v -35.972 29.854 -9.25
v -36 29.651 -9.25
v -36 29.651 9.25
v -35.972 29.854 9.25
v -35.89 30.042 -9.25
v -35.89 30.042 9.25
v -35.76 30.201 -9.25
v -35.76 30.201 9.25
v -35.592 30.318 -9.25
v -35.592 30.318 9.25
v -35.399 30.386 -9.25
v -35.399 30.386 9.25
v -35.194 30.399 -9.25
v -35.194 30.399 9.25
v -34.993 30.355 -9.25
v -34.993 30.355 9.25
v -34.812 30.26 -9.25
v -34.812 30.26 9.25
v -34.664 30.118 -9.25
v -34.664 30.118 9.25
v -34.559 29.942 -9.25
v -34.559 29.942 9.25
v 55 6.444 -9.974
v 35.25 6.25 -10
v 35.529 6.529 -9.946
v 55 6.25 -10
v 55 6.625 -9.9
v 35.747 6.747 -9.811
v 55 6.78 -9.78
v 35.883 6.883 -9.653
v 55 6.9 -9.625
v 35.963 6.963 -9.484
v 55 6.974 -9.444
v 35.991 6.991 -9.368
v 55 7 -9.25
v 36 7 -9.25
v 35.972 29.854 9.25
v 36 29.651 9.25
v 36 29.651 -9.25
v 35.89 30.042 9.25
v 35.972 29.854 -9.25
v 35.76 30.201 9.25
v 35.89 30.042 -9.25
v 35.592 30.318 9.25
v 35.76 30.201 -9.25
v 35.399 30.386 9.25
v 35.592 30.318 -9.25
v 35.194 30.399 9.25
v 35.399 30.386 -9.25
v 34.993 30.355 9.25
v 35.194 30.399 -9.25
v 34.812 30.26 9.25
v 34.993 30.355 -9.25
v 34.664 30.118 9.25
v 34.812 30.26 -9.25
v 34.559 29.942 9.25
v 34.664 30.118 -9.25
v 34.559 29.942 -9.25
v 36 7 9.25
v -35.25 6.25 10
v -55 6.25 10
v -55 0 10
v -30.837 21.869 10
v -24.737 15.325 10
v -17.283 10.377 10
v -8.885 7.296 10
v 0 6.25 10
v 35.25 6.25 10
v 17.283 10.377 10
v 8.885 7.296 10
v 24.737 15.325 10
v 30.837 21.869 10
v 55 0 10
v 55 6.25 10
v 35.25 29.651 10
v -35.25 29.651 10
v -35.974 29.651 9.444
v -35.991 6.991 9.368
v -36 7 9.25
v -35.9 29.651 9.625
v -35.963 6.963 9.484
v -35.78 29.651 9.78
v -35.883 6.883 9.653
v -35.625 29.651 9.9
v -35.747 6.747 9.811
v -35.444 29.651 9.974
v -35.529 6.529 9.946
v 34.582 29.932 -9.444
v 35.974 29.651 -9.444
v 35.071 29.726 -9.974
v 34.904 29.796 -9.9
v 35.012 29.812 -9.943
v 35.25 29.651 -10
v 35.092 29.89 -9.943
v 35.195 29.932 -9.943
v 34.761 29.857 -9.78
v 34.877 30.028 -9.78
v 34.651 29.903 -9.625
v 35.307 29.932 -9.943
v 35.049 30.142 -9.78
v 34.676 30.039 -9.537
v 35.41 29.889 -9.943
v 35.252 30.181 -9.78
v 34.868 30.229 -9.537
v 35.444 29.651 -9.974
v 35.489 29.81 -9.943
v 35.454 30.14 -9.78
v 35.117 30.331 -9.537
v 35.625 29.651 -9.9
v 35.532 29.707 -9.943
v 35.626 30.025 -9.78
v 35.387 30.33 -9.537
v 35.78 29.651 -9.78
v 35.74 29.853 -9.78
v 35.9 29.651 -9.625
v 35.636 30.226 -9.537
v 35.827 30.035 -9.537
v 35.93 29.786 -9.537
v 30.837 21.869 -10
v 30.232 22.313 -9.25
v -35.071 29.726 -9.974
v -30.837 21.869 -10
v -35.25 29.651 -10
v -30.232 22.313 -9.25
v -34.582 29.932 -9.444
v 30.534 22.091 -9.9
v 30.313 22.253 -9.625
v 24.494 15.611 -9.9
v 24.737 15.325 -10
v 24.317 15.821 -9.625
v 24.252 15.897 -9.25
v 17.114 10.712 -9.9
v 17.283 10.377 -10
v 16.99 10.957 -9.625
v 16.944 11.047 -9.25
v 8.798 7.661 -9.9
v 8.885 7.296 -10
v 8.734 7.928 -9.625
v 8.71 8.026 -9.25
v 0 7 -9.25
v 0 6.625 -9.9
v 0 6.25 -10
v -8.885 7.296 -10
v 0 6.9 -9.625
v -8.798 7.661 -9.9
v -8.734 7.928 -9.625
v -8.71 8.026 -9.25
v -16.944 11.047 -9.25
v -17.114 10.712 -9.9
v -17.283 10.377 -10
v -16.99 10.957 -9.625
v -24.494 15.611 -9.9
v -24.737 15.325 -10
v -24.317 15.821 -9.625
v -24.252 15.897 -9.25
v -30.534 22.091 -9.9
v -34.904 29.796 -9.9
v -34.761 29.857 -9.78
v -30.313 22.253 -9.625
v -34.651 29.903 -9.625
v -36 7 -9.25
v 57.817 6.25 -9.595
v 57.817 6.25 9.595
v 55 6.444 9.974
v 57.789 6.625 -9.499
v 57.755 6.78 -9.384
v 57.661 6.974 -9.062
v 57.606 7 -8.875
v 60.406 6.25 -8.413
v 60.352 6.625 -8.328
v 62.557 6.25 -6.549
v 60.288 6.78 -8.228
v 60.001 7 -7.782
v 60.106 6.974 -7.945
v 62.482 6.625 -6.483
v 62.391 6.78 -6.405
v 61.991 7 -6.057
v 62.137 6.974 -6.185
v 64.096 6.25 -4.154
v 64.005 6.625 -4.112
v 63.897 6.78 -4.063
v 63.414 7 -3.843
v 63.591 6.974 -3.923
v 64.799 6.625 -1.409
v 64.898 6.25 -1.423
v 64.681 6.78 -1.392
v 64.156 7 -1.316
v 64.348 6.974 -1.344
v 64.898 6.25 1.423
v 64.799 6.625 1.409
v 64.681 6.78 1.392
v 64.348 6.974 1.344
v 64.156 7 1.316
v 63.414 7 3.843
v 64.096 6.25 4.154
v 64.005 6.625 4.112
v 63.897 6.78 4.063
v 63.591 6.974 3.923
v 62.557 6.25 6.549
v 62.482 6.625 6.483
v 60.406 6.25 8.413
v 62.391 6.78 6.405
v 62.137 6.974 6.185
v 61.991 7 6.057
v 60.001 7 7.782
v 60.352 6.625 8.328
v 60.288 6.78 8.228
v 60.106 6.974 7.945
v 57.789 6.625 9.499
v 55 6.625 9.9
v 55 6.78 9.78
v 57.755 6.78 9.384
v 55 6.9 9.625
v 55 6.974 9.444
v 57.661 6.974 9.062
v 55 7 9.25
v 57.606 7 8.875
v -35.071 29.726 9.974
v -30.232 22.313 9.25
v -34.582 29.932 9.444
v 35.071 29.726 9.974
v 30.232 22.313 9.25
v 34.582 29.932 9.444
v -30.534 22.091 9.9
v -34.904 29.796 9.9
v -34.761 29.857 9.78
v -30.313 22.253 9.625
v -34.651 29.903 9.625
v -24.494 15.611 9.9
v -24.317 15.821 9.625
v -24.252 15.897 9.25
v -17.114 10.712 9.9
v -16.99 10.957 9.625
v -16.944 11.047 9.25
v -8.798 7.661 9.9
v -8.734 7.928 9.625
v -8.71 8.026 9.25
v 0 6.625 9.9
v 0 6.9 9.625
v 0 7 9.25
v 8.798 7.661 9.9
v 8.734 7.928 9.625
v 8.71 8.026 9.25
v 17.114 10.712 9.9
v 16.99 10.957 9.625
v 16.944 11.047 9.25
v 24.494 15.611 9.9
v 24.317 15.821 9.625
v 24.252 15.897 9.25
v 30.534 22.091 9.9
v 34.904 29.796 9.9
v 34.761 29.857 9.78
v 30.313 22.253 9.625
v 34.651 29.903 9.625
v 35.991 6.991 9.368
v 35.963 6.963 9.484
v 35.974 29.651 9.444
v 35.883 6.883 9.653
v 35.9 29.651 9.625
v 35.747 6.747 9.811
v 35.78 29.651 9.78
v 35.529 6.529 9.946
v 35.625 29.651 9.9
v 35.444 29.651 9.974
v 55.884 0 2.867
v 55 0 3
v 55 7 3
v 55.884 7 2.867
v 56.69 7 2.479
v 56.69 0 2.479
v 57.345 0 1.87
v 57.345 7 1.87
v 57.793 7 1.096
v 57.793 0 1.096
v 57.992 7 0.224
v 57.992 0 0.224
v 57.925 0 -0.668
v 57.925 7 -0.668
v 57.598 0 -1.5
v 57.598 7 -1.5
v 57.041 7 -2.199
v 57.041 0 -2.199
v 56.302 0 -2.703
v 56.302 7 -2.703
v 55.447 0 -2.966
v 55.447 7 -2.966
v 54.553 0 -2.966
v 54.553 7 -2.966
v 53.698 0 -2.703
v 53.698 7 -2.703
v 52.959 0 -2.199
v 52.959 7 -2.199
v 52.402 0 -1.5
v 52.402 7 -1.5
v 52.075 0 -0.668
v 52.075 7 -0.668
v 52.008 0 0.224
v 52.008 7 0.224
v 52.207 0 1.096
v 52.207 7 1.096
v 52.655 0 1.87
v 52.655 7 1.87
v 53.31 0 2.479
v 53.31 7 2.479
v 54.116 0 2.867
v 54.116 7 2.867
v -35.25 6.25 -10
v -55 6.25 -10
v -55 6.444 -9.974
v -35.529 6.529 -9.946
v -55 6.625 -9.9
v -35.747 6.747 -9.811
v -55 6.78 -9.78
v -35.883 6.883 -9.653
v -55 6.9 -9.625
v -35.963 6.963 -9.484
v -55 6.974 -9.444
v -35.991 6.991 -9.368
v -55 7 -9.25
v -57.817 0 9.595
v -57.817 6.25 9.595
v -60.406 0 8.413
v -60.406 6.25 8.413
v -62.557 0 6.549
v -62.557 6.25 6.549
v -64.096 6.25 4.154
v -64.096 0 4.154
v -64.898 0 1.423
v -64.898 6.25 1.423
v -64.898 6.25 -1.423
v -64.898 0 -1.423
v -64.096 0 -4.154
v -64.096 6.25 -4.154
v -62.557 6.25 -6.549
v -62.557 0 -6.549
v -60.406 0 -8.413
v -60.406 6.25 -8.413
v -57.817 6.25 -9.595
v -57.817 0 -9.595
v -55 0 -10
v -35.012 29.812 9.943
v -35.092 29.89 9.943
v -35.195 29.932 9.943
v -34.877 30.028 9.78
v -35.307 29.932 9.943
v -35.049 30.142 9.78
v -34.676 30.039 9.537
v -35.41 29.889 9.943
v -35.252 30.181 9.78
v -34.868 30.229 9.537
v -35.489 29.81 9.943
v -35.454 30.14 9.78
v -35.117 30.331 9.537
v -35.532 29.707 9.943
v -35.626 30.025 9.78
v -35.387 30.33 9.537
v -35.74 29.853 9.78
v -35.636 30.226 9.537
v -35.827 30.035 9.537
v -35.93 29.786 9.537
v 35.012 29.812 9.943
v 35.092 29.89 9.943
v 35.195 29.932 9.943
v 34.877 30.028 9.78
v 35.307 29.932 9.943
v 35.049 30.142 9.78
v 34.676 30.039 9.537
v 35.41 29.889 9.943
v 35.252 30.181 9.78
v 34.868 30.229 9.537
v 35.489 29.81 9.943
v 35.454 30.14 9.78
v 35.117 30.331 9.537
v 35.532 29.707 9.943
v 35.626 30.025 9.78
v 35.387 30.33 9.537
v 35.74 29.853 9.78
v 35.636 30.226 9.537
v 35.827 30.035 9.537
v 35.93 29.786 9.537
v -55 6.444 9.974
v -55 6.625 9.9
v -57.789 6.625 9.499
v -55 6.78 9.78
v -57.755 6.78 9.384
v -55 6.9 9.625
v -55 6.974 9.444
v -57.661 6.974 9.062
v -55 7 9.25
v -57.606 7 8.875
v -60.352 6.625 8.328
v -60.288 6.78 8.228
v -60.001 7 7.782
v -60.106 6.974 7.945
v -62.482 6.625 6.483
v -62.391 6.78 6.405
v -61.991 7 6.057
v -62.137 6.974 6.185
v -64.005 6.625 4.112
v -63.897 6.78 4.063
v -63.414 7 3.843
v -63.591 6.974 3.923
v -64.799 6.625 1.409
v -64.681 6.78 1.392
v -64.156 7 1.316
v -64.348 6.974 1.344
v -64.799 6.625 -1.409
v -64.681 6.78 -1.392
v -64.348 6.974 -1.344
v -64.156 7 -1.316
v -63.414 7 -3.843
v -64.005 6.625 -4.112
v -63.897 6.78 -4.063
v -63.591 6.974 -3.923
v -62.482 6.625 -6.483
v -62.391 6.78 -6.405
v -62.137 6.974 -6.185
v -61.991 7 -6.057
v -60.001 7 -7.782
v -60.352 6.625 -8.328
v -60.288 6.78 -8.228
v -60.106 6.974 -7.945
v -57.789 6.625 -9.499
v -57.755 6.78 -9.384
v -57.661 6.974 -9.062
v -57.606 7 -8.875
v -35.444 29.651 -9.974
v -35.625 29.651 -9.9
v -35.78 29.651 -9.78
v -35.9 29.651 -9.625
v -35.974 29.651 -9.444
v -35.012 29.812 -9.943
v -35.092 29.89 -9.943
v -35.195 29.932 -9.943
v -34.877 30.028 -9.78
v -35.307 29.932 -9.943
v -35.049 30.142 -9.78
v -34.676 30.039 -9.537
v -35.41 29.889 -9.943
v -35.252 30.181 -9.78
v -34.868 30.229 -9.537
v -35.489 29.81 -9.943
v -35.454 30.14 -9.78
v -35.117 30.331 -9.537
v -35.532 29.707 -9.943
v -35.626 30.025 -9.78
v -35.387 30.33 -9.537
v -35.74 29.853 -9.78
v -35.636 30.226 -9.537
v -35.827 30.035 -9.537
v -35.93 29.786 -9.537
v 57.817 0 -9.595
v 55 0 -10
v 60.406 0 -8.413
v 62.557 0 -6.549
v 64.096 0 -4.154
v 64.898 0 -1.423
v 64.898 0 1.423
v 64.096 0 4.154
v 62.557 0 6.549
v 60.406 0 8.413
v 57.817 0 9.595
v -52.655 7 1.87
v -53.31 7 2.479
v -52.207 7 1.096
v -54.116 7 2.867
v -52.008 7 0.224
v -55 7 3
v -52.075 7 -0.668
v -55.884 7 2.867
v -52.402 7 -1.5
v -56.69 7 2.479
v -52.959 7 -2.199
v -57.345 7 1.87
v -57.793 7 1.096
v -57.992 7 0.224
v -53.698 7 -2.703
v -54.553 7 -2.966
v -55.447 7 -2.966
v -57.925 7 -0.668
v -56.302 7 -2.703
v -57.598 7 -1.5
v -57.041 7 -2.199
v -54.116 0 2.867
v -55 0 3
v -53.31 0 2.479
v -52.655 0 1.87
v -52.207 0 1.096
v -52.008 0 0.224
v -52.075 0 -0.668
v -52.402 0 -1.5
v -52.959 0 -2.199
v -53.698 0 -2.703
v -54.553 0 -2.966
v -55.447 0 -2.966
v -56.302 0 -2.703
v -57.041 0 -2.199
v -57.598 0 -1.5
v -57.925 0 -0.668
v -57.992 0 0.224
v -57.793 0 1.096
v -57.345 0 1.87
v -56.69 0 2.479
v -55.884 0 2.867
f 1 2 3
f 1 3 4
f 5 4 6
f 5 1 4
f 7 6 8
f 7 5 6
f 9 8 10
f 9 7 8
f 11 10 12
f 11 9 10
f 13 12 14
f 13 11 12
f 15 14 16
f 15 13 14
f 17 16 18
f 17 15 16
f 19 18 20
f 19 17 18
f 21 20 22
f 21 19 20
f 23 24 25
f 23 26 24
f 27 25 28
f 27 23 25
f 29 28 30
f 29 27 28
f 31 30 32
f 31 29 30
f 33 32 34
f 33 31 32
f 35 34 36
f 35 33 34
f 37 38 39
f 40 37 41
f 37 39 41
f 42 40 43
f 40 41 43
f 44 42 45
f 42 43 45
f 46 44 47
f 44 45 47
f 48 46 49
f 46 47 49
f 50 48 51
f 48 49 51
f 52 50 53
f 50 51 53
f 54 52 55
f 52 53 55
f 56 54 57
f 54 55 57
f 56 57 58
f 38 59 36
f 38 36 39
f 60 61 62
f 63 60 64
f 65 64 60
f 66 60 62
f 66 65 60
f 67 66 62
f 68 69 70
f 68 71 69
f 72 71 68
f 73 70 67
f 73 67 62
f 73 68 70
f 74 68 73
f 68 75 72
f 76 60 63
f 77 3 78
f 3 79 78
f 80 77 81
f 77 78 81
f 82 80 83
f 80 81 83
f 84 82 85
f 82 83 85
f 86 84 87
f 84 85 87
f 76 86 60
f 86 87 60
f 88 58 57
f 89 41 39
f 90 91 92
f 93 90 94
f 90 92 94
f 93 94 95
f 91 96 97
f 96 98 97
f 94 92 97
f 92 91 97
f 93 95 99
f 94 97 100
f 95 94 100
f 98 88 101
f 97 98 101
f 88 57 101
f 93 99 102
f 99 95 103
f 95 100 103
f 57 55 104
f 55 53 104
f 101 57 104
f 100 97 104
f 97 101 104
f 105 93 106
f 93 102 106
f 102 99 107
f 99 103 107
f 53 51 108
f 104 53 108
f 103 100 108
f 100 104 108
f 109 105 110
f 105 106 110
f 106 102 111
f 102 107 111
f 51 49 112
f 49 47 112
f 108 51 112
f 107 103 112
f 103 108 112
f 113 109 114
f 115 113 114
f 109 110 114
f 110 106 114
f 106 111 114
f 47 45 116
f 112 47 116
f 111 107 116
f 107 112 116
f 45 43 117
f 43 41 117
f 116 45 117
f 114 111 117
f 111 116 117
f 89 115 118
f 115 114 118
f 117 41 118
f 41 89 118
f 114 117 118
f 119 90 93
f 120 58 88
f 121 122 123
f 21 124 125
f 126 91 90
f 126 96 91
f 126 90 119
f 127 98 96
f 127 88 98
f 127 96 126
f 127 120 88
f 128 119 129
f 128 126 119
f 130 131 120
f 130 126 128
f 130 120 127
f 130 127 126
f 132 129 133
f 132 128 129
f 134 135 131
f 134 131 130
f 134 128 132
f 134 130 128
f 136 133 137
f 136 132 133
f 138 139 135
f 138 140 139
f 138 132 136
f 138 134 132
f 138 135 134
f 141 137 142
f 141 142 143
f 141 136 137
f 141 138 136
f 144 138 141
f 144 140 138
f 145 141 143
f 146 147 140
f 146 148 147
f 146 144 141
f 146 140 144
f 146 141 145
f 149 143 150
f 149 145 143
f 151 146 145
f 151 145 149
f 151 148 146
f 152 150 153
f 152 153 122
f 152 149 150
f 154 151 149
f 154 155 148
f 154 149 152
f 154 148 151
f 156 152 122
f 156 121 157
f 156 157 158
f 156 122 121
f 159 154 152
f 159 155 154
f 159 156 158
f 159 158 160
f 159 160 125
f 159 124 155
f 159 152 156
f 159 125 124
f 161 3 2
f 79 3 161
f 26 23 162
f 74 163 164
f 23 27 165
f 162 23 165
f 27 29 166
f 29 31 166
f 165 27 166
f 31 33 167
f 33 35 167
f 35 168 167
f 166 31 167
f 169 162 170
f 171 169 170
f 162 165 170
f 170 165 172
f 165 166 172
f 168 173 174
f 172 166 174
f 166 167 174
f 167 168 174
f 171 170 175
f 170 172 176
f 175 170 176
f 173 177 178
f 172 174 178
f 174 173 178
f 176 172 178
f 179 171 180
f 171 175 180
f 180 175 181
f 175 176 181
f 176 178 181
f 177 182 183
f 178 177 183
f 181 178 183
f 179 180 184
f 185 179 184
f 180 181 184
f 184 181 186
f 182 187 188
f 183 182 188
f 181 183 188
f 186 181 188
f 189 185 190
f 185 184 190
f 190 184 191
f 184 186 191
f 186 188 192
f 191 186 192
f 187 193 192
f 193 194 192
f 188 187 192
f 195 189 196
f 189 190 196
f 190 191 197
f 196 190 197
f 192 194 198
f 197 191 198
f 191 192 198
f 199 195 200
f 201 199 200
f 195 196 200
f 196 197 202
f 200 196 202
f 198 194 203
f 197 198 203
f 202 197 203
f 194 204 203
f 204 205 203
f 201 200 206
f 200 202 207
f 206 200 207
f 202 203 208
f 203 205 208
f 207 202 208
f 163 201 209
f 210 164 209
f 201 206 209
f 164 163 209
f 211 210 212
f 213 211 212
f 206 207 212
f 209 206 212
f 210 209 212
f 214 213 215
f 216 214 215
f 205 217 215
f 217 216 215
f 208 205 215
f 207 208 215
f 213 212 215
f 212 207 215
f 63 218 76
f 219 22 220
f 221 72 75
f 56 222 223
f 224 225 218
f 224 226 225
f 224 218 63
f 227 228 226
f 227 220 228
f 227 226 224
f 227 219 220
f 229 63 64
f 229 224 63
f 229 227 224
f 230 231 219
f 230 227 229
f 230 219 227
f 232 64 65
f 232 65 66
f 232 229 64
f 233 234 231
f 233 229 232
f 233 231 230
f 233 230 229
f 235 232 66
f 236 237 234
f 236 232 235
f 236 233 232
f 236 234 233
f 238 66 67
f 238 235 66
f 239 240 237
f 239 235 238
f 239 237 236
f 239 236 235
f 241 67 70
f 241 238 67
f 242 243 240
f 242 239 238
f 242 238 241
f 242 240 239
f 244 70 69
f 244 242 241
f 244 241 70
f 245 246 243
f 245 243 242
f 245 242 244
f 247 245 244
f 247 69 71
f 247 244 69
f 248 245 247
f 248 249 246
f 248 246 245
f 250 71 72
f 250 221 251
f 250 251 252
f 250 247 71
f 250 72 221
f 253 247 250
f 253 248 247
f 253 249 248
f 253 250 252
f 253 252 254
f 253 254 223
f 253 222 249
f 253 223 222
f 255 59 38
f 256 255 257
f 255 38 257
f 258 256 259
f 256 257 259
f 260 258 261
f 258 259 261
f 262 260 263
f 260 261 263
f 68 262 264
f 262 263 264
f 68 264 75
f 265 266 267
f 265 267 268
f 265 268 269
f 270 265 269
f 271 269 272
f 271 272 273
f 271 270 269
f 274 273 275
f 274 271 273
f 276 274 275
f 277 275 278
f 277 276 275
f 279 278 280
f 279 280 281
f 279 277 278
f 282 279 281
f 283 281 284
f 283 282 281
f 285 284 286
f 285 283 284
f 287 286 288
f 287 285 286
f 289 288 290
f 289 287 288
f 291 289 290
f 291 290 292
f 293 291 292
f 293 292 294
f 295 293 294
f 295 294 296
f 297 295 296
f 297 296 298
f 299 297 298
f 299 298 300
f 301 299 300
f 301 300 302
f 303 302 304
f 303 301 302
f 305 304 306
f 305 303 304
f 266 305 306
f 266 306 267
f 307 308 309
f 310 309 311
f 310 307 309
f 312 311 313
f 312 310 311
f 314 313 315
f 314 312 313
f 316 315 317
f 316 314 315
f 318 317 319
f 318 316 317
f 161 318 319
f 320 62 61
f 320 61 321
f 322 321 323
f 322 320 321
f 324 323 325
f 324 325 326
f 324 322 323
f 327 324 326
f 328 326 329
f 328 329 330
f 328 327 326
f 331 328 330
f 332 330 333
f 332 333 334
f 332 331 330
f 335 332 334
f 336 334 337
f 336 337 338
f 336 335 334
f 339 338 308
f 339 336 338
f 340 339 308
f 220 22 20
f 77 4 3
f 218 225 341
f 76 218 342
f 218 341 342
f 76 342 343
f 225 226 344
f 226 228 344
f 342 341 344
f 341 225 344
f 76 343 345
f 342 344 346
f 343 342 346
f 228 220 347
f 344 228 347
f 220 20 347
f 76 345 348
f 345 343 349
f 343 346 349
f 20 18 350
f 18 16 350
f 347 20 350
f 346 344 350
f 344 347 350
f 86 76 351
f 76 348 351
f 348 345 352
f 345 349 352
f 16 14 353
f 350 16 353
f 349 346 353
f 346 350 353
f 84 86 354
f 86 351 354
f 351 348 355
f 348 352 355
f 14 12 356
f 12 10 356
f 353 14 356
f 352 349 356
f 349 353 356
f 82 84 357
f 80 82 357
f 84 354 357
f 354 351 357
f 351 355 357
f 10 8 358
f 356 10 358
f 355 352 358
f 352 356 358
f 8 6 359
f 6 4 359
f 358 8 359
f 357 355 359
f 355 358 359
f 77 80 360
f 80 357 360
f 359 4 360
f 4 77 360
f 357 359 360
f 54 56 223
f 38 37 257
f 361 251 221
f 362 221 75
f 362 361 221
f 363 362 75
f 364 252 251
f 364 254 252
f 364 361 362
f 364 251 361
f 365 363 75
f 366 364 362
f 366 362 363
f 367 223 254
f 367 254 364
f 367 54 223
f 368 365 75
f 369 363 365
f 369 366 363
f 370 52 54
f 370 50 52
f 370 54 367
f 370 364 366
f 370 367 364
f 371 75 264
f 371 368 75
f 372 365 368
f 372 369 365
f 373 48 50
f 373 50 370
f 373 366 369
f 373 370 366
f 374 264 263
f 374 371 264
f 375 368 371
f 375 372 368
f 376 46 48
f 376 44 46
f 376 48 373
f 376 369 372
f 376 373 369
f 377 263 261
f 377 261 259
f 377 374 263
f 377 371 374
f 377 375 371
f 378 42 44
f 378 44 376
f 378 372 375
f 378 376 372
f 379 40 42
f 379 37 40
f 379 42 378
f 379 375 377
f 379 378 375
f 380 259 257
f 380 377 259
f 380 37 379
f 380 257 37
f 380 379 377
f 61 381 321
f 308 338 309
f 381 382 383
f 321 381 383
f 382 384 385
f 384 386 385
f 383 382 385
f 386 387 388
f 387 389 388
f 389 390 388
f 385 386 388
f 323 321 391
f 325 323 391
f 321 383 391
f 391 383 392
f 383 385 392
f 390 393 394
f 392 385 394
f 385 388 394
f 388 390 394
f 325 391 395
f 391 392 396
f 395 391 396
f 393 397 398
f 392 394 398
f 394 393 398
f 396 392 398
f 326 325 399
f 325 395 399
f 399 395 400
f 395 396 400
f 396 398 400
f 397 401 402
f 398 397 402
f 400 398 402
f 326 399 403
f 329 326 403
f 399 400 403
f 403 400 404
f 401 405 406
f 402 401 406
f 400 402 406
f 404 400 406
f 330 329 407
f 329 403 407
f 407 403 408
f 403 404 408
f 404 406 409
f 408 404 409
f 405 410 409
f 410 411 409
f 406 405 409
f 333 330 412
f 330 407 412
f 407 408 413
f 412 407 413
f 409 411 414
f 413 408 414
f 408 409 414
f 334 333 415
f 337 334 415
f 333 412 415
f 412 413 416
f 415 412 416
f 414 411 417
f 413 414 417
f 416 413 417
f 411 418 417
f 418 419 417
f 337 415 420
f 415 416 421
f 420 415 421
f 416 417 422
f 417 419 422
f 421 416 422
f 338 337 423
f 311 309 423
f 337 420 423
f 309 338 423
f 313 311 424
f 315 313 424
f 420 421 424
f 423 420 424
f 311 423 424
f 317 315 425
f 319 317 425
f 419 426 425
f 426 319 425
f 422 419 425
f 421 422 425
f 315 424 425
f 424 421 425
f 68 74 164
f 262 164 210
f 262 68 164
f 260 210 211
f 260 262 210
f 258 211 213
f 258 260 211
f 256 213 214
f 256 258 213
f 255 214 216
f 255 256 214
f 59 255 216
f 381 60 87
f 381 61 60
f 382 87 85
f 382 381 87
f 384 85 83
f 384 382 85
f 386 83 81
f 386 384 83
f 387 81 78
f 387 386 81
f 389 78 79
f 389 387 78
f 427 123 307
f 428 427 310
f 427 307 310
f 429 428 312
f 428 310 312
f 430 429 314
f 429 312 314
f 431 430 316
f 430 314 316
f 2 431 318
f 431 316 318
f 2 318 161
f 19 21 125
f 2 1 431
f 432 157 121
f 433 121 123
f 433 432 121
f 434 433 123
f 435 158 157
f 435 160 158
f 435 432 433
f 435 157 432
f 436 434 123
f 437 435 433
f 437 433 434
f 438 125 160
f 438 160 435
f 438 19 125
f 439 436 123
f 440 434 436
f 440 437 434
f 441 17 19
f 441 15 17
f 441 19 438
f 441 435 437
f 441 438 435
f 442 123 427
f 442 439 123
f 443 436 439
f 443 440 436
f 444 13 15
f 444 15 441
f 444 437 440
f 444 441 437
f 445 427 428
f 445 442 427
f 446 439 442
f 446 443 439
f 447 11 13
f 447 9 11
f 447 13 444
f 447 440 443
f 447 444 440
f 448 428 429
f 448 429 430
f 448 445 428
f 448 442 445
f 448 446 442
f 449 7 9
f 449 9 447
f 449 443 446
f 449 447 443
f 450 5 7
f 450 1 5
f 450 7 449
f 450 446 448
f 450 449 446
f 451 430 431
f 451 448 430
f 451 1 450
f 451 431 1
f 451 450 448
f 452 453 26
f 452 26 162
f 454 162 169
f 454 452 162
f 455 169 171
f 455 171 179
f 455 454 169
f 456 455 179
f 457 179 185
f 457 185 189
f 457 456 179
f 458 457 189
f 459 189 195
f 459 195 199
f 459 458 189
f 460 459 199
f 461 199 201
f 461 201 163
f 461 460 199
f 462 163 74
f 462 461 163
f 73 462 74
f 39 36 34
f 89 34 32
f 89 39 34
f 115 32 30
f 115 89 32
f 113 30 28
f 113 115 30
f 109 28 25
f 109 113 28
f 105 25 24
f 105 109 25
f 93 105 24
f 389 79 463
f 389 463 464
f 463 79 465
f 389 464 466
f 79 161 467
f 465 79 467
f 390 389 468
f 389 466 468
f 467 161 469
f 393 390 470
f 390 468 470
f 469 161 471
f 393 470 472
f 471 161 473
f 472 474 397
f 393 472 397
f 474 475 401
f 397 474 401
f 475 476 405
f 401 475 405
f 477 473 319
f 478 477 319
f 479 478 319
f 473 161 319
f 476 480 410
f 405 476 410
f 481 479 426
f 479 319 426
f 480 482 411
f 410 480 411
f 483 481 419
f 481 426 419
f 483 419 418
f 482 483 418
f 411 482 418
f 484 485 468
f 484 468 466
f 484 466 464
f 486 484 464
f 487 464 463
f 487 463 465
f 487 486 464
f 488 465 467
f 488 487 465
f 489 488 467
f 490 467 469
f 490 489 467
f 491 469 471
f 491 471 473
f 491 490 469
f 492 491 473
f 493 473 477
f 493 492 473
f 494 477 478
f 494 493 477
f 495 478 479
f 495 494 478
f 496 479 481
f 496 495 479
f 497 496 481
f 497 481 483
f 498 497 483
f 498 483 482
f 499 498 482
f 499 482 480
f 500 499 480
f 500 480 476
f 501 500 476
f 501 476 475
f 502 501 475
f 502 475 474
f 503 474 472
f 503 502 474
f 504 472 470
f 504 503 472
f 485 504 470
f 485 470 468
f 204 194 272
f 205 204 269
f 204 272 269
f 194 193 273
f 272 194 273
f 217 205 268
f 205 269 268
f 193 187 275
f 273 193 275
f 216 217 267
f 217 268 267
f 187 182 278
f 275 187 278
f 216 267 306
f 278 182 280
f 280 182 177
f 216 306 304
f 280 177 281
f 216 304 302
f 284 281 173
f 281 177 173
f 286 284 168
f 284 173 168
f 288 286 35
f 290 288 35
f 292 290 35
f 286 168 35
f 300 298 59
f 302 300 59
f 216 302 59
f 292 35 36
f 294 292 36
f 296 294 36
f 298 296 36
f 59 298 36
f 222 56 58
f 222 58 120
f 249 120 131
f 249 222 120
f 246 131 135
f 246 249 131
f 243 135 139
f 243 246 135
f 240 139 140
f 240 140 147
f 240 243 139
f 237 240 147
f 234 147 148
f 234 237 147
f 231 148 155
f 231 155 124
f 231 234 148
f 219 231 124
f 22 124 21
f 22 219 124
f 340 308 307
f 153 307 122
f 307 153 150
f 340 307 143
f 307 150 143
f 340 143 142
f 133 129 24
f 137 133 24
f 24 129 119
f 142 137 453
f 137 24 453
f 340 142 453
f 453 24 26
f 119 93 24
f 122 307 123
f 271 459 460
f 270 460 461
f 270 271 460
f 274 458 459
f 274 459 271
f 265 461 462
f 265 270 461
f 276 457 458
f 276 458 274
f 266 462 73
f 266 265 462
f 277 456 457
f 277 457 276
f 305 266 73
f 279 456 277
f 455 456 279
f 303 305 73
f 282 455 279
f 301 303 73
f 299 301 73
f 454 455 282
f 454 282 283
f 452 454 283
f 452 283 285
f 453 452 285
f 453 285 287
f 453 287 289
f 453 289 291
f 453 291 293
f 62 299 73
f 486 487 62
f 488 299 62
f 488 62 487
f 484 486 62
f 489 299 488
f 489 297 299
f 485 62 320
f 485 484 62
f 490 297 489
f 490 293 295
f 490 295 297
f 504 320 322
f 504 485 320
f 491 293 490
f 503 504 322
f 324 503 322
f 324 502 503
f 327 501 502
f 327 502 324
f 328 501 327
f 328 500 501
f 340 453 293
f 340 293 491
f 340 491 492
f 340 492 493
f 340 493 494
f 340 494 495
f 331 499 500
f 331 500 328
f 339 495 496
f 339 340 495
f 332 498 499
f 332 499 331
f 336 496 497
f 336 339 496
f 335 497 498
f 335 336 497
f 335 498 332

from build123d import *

# Parameters (mm, degrees)
SKETCH1_R           = 3
BOSS_EXTRUDE1_DEPTH = 7
BOSS_EXTRUDE2_DEPTH = 20
FILLET1_R           = 0.75


with BuildPart() as part:
    # Sketch1 → Boss-Extrude1 (new body)
    with BuildSketch(Plane(origin=(0, 0, 0), x_dir=(1, 0, 0), z_dir=(0, 1, 0))):
        with BuildLine():
            Line((-55, 10), (55, 10))
            ThreePointArc((55, 10), (65, 0), (55, -10))
            Line((55, -10), (-55, -10))
            ThreePointArc((-55, -10), (-65, 0), (-55, 10))
        make_face()
        with Locations(Location((-55, 0, 0), (0, 0, 270))):
            Circle(SKETCH1_R, mode=Mode.SUBTRACT)
        with Locations(Location((55, 0, 0), (0, 0, 270))):
            Circle(SKETCH1_R, mode=Mode.SUBTRACT)
    extrude(amount=BOSS_EXTRUDE1_DEPTH)

    # Sketch2 → Boss-Extrude2 (add)
    with BuildSketch(Plane.XY.offset(10)):
        with BuildLine():
            Line((-9.5e-08, 7), (36, 7))
            Line((36, 7), (36, 34))
            ThreePointArc((36, 34), (22.499999962, 14.499999972), (-9.5e-08, 7))
        make_face()
        with BuildLine():
            Line((-36, 7), (-9.5e-08, 7))
            ThreePointArc((-9.5e-08, 7), (-22.500000038, 14.500000028), (-36, 34))
            Line((-36, 34), (-36, 7))
        make_face()
    extrude(amount=-BOSS_EXTRUDE2_DEPTH)

    # Fillet1
    fillet1_edges = [part.edges().sort_by_distance(p)[0] for p in [
        (65, 7, 0),
        (45.5, 7, -10),
        (45.5, 7, 10),
        (36, 20.5, 10),
        (36, 34, 0),
        (0, 7, -10),
        (0, 7, 10),
        (36, 20.5, -10),
        (-45.5, 7, -10),
        (-36, 20.5, -10),
        (-36, 20.5, 10),
        (-36, 34, 0),
        (-65, 7, 0),
        (-45.5, 7, 10),
    ]]
    fillet(fillet1_edges, radius=FILLET1_R)


solid = part.part
